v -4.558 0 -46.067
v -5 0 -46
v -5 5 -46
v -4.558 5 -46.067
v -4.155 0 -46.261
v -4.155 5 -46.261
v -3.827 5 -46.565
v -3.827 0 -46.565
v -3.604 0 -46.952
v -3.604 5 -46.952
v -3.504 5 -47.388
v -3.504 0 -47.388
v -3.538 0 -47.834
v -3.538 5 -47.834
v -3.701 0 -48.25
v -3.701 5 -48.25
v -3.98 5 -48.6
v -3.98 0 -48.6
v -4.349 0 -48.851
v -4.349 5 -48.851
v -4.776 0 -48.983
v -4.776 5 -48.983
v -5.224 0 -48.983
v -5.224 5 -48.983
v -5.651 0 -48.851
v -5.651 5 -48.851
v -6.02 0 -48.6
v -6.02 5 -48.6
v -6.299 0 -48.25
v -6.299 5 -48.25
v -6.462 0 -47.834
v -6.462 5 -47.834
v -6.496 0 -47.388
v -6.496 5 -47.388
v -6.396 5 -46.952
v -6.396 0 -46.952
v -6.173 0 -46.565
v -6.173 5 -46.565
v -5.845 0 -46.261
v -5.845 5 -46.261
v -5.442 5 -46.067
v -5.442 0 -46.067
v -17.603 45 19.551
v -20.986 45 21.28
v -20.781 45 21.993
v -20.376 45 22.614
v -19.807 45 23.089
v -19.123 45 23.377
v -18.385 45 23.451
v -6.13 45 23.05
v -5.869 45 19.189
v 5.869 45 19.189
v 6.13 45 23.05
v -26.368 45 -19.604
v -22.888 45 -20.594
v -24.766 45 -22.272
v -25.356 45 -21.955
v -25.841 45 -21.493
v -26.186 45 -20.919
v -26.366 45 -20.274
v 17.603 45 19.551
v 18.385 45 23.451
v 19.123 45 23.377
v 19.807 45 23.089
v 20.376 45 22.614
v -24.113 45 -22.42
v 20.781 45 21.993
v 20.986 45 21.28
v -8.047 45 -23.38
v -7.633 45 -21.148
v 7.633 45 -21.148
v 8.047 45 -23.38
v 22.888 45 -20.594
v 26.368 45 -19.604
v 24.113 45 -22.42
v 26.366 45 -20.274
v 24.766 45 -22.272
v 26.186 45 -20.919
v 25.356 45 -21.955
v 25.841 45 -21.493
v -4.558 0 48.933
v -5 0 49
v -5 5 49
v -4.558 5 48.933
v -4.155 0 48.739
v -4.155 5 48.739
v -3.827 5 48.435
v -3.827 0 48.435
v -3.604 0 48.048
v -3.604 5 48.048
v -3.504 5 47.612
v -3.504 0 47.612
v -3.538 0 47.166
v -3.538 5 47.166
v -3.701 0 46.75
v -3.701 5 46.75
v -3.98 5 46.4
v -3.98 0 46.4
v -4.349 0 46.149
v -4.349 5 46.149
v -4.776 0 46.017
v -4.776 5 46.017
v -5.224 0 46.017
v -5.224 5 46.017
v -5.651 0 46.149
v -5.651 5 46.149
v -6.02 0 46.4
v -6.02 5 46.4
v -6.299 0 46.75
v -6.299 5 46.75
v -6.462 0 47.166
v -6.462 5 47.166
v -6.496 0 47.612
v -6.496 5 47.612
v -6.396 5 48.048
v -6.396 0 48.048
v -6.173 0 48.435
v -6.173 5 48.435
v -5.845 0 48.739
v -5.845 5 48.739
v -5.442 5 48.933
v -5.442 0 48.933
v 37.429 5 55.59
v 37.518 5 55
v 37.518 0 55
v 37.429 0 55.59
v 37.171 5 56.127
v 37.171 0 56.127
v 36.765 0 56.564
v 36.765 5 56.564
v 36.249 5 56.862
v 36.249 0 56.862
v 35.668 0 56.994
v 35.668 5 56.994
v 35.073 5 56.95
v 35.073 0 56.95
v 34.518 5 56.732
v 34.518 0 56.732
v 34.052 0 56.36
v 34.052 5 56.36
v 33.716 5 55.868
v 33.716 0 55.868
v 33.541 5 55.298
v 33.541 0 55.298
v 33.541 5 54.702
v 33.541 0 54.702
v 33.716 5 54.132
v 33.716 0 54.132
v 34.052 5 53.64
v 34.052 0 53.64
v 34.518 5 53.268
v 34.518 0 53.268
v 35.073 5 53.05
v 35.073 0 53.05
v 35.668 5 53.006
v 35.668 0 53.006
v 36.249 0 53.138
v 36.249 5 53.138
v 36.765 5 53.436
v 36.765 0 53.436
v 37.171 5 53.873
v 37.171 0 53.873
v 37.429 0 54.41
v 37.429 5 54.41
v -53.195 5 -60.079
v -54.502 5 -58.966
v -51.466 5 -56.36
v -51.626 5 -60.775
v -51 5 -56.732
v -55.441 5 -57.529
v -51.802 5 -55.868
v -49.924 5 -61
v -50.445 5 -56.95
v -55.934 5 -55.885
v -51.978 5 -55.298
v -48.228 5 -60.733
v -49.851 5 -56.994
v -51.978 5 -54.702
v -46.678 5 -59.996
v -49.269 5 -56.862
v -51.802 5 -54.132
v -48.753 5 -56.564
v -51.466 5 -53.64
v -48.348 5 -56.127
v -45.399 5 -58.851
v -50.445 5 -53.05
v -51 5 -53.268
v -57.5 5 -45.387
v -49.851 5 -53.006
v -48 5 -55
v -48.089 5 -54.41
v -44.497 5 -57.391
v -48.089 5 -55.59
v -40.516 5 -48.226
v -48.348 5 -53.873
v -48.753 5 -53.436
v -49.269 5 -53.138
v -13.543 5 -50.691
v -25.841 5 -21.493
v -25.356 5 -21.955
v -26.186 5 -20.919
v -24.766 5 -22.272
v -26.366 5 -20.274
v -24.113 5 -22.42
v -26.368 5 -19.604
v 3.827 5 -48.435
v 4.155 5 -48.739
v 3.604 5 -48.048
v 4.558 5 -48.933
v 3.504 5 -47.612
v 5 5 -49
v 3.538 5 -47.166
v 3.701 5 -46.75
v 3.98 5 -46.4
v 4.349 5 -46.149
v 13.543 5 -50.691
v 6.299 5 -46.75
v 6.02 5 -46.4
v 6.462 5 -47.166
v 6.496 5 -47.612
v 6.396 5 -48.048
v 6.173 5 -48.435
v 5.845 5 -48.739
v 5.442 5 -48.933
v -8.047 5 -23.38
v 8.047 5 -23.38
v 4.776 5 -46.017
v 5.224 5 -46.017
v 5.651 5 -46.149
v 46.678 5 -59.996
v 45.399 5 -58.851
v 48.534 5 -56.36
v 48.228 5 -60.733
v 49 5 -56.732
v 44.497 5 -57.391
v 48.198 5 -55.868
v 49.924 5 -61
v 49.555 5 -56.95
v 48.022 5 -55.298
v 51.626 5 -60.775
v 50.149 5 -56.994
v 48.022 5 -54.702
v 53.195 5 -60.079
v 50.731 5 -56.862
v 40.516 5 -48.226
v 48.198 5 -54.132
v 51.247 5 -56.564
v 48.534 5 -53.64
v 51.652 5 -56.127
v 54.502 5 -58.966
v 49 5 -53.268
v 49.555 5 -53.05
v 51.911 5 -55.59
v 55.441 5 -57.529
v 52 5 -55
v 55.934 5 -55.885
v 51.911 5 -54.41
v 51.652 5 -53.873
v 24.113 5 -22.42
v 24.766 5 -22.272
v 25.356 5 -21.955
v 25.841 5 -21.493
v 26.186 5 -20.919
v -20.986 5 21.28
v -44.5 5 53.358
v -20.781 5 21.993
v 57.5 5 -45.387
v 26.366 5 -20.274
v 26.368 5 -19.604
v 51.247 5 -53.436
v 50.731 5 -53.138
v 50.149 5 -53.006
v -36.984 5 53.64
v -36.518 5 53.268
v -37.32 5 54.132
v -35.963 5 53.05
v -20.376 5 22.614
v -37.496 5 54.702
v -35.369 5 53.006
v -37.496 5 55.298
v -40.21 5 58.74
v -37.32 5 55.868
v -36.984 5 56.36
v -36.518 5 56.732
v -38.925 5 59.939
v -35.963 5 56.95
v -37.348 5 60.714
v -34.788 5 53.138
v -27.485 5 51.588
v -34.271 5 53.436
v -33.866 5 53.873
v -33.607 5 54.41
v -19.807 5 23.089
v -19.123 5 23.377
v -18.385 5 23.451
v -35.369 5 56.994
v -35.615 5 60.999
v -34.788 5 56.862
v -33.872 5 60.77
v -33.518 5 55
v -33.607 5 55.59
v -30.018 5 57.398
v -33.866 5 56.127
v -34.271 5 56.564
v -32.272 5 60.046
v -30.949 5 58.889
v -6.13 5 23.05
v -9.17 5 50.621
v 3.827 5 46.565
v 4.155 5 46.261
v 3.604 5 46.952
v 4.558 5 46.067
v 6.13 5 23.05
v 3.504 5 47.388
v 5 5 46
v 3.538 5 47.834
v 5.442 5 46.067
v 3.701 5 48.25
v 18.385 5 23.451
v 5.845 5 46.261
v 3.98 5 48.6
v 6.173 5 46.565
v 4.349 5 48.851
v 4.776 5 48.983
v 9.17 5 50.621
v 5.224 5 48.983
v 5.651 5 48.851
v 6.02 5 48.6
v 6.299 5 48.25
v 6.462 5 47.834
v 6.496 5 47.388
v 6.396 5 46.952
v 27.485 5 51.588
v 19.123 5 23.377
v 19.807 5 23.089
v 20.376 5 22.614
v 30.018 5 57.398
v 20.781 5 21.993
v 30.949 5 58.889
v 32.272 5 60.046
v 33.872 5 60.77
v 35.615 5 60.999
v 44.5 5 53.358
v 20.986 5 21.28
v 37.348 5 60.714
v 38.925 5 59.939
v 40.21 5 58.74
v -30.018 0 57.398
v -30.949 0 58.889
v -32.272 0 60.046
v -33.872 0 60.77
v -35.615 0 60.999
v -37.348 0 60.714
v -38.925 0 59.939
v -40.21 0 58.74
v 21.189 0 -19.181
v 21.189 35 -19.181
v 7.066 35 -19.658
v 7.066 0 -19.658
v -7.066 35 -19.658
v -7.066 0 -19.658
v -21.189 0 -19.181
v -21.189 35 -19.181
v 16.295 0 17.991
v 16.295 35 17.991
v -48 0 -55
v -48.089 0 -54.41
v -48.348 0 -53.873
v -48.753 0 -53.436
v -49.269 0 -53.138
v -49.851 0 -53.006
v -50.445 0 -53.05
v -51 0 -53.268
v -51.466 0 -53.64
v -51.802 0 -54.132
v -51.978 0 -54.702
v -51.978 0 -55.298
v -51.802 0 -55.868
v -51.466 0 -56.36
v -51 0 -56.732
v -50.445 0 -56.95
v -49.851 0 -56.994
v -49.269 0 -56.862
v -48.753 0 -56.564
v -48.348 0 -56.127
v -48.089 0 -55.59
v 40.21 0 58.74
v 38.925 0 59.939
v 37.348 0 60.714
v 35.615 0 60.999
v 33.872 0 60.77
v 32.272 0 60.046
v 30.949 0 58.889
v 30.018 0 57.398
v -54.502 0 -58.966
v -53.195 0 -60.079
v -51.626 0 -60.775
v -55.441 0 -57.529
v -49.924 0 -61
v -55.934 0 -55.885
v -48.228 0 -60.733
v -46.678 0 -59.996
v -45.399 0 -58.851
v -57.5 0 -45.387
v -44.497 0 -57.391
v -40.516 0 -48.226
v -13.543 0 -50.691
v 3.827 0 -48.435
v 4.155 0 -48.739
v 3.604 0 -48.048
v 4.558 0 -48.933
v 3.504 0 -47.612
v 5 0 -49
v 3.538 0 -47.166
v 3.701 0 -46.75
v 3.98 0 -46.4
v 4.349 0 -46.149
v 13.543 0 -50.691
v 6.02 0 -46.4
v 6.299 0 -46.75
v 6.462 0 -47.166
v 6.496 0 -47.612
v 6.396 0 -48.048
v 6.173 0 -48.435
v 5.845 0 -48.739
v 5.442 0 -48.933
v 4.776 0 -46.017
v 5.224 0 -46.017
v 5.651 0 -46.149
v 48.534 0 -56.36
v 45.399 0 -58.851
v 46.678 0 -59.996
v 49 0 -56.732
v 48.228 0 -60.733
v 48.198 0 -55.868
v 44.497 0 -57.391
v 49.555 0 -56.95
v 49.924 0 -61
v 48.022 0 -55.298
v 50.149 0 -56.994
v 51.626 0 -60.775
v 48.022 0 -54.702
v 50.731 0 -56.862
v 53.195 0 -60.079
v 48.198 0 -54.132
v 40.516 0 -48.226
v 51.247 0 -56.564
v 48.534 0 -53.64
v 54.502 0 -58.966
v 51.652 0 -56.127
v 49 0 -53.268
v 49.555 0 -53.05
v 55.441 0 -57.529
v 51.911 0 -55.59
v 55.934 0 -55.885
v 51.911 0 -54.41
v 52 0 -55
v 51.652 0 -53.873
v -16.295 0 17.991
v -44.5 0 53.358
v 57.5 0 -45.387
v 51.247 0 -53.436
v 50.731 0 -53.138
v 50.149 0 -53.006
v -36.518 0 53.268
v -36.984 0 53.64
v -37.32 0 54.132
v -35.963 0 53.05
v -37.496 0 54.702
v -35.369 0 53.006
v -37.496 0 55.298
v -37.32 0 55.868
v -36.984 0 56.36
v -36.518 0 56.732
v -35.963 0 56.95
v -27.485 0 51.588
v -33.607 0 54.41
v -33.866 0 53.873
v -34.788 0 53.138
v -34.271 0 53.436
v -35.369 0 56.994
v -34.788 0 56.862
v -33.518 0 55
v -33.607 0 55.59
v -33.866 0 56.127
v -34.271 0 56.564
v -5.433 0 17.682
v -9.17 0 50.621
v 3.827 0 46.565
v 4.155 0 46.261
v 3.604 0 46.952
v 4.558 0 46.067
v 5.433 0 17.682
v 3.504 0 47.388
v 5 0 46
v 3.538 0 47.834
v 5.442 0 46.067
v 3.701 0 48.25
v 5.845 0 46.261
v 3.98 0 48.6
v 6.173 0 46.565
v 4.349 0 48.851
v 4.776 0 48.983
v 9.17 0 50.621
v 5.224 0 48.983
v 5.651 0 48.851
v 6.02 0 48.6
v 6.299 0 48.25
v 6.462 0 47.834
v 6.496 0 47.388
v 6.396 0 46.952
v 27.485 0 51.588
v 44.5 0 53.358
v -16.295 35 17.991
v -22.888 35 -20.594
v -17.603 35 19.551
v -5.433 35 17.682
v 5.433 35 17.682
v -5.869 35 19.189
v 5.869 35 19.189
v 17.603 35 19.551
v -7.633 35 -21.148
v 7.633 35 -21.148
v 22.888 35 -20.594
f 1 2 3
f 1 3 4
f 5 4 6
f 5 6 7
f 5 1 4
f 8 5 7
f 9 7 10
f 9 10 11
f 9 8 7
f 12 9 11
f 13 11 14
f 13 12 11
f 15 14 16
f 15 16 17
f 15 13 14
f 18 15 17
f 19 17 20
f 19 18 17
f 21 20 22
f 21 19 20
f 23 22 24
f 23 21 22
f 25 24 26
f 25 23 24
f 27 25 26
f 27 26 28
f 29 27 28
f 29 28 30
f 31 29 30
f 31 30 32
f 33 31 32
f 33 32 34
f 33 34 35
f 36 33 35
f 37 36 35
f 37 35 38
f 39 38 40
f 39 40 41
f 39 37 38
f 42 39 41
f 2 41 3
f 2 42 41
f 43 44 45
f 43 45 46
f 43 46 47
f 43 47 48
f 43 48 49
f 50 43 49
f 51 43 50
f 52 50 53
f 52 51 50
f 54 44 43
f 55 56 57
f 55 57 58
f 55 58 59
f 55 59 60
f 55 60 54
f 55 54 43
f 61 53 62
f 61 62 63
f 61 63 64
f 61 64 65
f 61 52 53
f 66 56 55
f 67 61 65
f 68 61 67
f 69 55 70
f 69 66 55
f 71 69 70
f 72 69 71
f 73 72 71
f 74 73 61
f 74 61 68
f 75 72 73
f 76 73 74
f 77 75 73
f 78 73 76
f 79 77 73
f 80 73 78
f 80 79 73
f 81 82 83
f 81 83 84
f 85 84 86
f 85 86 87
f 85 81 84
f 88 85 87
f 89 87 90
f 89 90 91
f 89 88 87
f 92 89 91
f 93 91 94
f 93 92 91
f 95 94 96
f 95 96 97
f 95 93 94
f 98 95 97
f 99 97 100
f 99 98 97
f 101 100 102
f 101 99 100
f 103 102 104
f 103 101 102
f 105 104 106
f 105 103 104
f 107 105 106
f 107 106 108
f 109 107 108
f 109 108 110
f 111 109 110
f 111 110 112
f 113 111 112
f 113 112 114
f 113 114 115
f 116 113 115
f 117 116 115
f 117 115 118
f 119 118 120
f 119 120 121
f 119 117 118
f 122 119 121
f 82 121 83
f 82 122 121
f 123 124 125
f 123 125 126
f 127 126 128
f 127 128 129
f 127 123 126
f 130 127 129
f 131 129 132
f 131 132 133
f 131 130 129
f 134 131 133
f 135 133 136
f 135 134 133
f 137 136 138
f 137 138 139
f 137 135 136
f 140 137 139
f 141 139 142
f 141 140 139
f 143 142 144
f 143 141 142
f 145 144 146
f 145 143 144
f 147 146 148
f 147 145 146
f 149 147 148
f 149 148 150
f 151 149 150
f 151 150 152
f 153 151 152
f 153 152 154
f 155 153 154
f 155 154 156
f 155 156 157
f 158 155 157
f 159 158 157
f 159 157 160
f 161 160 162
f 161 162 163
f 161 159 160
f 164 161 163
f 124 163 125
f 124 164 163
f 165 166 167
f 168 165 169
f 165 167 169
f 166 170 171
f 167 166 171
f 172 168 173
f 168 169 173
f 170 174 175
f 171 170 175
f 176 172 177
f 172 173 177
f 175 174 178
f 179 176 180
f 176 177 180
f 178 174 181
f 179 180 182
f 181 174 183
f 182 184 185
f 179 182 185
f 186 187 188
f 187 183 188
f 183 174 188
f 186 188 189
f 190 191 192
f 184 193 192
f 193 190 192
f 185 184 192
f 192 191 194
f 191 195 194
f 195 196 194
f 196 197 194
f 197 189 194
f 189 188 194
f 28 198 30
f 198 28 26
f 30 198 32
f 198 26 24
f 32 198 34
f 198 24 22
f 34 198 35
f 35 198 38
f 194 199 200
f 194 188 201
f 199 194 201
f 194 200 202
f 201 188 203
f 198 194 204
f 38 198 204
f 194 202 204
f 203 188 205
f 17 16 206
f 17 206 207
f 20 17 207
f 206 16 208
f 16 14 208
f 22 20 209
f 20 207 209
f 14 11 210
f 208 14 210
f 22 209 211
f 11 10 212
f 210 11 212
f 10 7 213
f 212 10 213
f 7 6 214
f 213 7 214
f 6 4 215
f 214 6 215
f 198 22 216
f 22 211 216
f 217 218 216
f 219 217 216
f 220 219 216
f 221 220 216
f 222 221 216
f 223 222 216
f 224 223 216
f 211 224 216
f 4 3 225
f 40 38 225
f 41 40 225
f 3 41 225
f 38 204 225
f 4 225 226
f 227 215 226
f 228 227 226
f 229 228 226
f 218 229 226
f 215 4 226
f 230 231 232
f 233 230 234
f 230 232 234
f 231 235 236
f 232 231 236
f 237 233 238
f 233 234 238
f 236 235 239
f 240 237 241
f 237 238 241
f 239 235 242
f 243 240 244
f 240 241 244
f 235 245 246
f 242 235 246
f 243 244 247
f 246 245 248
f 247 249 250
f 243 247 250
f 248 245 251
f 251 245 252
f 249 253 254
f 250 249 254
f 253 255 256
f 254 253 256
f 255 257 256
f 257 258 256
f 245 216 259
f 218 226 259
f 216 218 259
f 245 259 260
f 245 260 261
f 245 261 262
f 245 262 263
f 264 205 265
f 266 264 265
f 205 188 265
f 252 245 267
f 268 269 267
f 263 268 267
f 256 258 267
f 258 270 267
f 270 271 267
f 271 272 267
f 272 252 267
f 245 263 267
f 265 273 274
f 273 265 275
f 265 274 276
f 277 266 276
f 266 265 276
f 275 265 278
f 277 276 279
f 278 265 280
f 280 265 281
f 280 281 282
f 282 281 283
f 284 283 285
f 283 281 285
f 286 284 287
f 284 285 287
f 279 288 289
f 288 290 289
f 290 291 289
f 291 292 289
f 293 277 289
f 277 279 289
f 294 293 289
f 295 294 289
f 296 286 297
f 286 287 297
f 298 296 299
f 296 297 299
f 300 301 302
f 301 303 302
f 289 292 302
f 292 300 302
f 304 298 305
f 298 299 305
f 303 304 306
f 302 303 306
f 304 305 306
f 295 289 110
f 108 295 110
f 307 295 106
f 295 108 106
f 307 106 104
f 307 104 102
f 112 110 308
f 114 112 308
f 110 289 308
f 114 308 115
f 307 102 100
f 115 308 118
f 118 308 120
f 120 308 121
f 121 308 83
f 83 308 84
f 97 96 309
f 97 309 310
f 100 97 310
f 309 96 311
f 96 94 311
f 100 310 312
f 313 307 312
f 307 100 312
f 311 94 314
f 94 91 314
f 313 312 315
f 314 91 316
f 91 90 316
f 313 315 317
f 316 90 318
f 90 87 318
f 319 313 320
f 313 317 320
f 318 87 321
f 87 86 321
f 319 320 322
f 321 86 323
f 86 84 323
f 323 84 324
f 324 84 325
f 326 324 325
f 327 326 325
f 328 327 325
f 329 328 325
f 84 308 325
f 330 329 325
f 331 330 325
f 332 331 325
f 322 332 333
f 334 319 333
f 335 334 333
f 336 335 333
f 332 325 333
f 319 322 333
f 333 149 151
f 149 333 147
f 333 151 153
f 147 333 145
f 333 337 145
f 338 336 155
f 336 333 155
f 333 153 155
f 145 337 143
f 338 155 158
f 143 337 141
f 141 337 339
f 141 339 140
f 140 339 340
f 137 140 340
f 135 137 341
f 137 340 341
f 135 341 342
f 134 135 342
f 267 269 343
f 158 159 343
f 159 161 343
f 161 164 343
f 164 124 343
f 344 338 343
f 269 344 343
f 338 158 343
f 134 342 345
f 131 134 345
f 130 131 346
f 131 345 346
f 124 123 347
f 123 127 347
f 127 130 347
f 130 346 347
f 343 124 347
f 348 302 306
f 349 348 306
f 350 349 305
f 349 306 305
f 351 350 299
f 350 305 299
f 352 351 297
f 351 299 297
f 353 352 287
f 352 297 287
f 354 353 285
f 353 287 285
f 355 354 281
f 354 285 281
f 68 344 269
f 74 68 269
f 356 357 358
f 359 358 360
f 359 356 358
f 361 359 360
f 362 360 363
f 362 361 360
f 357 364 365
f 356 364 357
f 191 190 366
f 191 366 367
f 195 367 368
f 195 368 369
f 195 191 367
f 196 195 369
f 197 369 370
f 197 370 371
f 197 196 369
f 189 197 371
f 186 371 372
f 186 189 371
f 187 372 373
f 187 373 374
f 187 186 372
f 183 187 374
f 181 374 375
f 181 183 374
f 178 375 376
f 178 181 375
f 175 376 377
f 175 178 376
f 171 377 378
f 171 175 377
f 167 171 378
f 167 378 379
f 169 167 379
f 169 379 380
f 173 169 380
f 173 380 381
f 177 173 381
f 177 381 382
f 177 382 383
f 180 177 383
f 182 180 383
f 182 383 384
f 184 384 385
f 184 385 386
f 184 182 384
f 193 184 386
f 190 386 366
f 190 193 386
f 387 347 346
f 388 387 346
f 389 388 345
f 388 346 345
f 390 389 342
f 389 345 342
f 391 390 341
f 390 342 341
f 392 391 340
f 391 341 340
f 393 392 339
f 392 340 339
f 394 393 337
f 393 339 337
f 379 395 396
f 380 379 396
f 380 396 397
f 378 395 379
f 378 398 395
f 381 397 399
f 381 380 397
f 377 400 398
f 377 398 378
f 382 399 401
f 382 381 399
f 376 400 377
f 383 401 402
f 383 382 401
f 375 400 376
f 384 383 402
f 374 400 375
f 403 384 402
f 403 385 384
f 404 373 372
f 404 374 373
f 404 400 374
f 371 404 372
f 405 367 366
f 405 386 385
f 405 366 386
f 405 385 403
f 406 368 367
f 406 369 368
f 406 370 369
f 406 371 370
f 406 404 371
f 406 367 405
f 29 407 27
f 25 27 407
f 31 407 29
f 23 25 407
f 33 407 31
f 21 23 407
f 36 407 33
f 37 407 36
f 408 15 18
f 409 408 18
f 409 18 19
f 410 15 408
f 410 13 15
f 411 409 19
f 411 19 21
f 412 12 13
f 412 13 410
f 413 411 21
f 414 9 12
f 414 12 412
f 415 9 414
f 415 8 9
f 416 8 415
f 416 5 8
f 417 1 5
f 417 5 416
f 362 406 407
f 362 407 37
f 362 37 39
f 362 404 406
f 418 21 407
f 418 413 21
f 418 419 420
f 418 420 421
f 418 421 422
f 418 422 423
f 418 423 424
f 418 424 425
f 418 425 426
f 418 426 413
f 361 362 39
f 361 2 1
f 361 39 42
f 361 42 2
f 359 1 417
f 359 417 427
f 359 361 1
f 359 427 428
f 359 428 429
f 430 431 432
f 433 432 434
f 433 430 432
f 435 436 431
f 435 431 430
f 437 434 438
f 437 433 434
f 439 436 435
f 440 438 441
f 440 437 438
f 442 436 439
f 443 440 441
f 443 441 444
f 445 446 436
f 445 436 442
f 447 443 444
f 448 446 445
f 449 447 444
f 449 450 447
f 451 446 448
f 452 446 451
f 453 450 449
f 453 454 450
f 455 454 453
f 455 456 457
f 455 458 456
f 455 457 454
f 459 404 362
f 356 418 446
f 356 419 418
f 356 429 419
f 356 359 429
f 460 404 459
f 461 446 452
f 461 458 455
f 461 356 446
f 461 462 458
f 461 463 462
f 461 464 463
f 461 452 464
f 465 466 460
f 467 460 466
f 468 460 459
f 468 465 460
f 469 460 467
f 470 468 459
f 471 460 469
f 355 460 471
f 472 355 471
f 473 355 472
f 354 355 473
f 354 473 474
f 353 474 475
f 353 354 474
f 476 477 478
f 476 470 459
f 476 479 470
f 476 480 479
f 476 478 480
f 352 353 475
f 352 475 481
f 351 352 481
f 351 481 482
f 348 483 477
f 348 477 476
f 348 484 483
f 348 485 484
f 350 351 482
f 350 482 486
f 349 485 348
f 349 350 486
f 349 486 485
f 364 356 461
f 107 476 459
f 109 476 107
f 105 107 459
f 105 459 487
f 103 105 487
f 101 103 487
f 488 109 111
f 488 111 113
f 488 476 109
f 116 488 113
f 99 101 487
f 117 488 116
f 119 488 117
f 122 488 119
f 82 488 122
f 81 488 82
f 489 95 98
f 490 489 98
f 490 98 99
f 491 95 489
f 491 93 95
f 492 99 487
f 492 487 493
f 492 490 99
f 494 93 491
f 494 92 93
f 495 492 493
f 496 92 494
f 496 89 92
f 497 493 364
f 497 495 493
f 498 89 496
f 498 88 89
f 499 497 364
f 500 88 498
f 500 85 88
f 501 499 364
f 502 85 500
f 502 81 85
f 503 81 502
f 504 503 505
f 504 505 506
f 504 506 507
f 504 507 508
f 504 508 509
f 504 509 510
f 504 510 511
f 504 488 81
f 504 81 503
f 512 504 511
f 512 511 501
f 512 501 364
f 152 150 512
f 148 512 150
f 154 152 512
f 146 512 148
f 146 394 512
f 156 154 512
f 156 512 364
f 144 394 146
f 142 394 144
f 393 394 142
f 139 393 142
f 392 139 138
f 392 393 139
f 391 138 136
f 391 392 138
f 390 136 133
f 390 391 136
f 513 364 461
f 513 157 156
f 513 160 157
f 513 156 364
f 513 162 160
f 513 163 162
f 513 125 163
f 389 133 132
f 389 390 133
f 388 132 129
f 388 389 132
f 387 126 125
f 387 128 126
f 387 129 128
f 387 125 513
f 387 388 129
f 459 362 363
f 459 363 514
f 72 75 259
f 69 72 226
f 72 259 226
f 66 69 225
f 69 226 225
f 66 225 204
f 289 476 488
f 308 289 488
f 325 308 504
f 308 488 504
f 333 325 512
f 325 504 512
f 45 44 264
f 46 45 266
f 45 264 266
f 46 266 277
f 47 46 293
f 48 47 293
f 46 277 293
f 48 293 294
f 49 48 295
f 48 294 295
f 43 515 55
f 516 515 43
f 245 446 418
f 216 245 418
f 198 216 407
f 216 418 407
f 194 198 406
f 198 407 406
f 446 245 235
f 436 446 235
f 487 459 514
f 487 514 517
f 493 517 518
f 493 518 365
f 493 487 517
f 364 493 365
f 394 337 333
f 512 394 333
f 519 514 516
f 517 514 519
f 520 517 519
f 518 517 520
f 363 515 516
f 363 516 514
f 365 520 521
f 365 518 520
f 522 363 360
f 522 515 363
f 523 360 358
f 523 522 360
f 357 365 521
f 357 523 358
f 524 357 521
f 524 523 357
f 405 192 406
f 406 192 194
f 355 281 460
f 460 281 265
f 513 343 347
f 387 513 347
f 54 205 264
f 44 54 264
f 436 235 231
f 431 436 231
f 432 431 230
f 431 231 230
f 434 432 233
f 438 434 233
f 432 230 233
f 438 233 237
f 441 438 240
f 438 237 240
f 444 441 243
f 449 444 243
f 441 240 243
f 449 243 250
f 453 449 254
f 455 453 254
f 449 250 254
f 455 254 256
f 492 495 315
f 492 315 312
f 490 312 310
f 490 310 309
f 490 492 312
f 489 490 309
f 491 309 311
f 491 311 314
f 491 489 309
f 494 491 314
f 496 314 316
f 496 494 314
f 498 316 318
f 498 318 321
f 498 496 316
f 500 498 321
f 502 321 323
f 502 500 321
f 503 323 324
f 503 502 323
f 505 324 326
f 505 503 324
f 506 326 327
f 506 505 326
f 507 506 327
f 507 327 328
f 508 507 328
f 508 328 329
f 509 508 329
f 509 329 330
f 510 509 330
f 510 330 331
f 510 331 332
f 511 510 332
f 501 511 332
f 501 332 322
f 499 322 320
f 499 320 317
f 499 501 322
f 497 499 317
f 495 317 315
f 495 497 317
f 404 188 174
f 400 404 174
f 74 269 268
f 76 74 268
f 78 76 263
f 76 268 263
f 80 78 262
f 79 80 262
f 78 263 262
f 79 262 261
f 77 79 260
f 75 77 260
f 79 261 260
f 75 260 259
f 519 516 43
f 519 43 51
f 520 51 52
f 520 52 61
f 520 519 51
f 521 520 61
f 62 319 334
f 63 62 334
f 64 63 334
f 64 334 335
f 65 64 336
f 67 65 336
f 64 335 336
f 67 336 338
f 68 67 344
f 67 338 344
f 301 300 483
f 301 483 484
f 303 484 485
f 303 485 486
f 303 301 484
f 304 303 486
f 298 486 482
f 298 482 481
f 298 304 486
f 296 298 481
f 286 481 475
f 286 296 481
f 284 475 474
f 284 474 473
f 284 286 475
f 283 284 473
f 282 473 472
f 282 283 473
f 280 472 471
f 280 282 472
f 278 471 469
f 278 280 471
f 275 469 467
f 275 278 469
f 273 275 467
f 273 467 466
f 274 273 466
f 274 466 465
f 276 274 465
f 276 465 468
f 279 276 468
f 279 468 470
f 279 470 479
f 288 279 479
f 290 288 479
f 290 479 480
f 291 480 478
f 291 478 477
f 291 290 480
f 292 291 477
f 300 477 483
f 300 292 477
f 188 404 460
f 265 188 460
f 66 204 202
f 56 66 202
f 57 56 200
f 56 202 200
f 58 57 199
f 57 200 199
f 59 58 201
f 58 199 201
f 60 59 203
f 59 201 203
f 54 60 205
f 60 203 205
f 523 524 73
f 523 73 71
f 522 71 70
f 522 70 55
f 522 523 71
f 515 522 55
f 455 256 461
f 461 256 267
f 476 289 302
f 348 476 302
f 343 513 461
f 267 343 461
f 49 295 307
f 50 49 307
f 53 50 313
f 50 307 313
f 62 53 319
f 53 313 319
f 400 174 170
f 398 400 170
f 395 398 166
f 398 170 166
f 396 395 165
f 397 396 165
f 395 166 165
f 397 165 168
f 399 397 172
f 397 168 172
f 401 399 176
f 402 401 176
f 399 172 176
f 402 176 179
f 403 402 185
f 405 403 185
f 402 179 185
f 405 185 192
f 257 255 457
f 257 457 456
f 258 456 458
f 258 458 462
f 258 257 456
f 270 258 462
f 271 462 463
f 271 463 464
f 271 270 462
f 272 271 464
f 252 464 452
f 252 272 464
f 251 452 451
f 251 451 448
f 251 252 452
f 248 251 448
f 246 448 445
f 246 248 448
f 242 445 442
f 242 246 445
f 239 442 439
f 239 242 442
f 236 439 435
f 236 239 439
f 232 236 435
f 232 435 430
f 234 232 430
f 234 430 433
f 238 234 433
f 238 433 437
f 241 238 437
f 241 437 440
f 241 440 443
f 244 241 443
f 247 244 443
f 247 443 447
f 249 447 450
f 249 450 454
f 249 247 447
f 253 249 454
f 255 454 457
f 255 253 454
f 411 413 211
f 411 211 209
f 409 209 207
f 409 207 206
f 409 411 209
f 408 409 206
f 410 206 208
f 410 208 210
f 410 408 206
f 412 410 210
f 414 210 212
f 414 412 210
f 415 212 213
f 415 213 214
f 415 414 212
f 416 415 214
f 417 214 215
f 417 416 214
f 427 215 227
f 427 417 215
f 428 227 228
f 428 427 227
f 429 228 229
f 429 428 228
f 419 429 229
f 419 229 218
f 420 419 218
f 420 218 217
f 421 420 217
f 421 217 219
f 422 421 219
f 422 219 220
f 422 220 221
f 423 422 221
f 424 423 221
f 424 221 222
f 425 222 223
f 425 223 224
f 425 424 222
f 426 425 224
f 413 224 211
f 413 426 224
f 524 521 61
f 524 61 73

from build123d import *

# Parameters (mm, degrees)
SKETCH1_R               = 1.5
BOSS_EXTRUDE1_DEPTH     = 5
BOSS_EXTRUDE2_DEPTH     = 40
CUT_EXTRUDE1_DEPTH      = 91.434261951
BOSS_EXTRUDE3_START     = -5
BOSS_EXTRUDE3_OUTLINE_R = 2
BOSS_EXTRUDE3_DEPTH     = 5
CUT_EXTRUDE2_START      = -10
CUT_EXTRUDE2_DEPTH      = 10


# Read off the part's stored shape, not the designer's step: Boss-Extrude3
with BuildPart() as part:
    # Sketch1 → Boss-Extrude1 (new body)
    with BuildSketch(Plane(origin=(0, 0, 0), x_dir=(1, 0, 0), z_dir=(0, 1, 0))):
        with BuildLine():
            Line((-57.5, 45.38652637), (-44.5, -53.358277095))
            ThreePointArc((-44.5, -53.358277095), (0, -50.5), (44.5, -53.358277095))
            Line((44.5, -53.358277095), (57.5, 45.38652637))
            ThreePointArc((57.5, 45.38652637), (0, 51), (-57.5, 45.38652637))
        make_face()
        with Locations(Location((-5, 47.5, 0), (0, 0, 270))):
            Circle(SKETCH1_R, mode=Mode.SUBTRACT)
        with Locations(Location((-5, -47.5, 0), (0, 0, 270))):
            Circle(SKETCH1_R, mode=Mode.SUBTRACT)
        with Locations(Location((5, -47.5, 0), (0, 0, 90))):
            Circle(SKETCH1_R, mode=Mode.SUBTRACT)
        with Locations(Location((5, 47.5, 0), (0, 0, 90))):
            Circle(SKETCH1_R, mode=Mode.SUBTRACT)
    extrude(amount=BOSS_EXTRUDE1_DEPTH)

    # Sketch2 → Boss-Extrude2 (add)
    with BuildSketch(Plane(origin=(0, 5, 0), x_dir=(1, 0, 0), z_dir=(0, 1, 0))):
        with BuildLine():
            Line((-26.368366328, 19.603975201), (-20.985908119, -21.279853883))
            ThreePointArc((-20.985908119, -21.279853883), (-20.109118271, -22.872956361), (-18.384839881, -23.450537503))
            ThreePointArc((-18.384839881, -23.450537503), (0, -23), (18.384839881, -23.450537503))
            ThreePointArc((18.384839881, -23.450537503), (20.109118271, -22.872956361), (20.985908119, -21.279853883))
            Line((20.985908119, -21.279853883), (26.368366328, 19.603975201))
            ThreePointArc((26.368366328, 19.603975201), (25.841207036, 21.492926829), (24.11319073, 22.420285883))
            ThreePointArc((24.11319073, 22.420285883), (0, 23.5), (-24.11319073, 22.420285883))
            ThreePointArc((-24.11319073, 22.420285883), (-25.841207036, 21.492926829), (-26.368366328, 19.603975201))
        make_face()
    extrude(amount=BOSS_EXTRUDE2_DEPTH)

    # Sketch3 → Cut-Extrude1 (cut, through all)
    with BuildSketch(Plane(origin=(0, 0, 0), x_dir=(1, 0, 0), z_dir=(0, 1, 0))):
        with BuildLine():
            Line((-21.18897611, 19.181297446), (-16.295136113, -17.99110784))
            ThreePointArc((-16.295136113, -17.99110784), (0, -17.643611739), (16.295136113, -17.99110784))
            Line((16.295136113, -17.99110784), (21.18897611, 19.181297446))
            ThreePointArc((21.18897611, 19.181297446), (0, 19.717805469), (-21.18897611, 19.181297446))
        make_face()
    extrude(amount=CUT_EXTRUDE1_DEPTH, mode=Mode.SUBTRACT)

    # Boss-Extrude3 outline → Boss-Extrude3 (add)
    # profile 1 of 4: a face of its own
    with BuildSketch(Plane.XZ.offset(BOSS_EXTRUDE3_START)):
        with BuildLine():
            Line((-44.496886412, -57.390761561), (-40.51552272, -48.226360981))
            ThreePointArc((-40.51552272, -48.226360981), (-49.028326901, -46.92944202), (-57.5, -45.38652637))
            Line((-57.5, -45.38652637), (-55.934374164, -55.884987732))
            ThreePointArc((-55.934374164, -55.884987732), (-50.783157153, -60.948669168), (-44.496886412, -57.390761561))
        make_face()
        with Locations((-50, -55)):
            Circle(BOSS_EXTRUDE3_OUTLINE_R, mode=Mode.SUBTRACT)
    # profile 2 of 4: a face of its own
    with BuildSketch(Plane.XZ.offset(BOSS_EXTRUDE3_START)):
        with BuildLine():
            Line((40.51552272, -48.226360981), (44.496886412, -57.390761561))
            ThreePointArc((44.496886412, -57.390761561), (50.783157153, -60.948669168), (55.934374164, -55.884987732))
            Line((55.934374164, -55.884987732), (57.5, -45.38652637))
            ThreePointArc((57.5, -45.38652637), (49.028326901, -46.92944202), (40.51552272, -48.226360981))
        make_face()
        with Locations((50, -55)):
            Circle(BOSS_EXTRUDE3_OUTLINE_R, mode=Mode.SUBTRACT)
    # profile 3 of 4: a face of its own
    with BuildSketch(Plane.XZ.offset(BOSS_EXTRUDE3_START)):
        with BuildLine():
            Line((44.5, 53.358277095), (40.209954991, 58.740009651))
            ThreePointArc((40.209954991, 58.740009651), (34.735068112, 60.948669168), (30.018376627, 57.398262905))
            Line((30.018376627, 57.398262905), (27.484562868, 51.587560448))
            ThreePointArc((27.484562868, 51.587560448), (36.003169058, 52.368295779), (44.5, 53.358277095))
        make_face()
        with Locations((35.518225265, 55)):
            Circle(BOSS_EXTRUDE3_OUTLINE_R, mode=Mode.SUBTRACT)
    # profile 4 of 4: a face of its own
    with BuildSketch(Plane.XZ.offset(BOSS_EXTRUDE3_START)):
        with BuildLine():
            ThreePointArc((-44.5, 53.358277095), (-36.003169058, 52.368295779), (-27.484562868, 51.587560448))
            Line((-27.484562868, 51.587560448), (-30.018376627, 57.398262905))
            ThreePointArc((-30.018376627, 57.398262905), (-34.735068112, 60.948669168), (-40.209954991, 58.740009651))
            Line((-40.209954991, 58.740009651), (-44.5, 53.358277095))
        make_face()
        with Locations((-35.518225265, 55)):
            Circle(BOSS_EXTRUDE3_OUTLINE_R, mode=Mode.SUBTRACT)
    extrude(amount=BOSS_EXTRUDE3_DEPTH)

    # Sketch9 → Cut-Extrude2 (cut)
    with BuildSketch(Plane(origin=(0, 45, 0), x_dir=(1, 0, 0), z_dir=(0, 1, 0)).offset(CUT_EXTRUDE2_START)):
        with BuildLine():
            Line((17.602749325, -19.55074577), (22.887903449, 20.593985408))
            ThreePointArc((22.887903449, 20.593985408), (0, 21.217805469), (-22.887903449, 20.593985408))
            Line((-22.887903449, 20.593985408), (-17.602749325, -19.55074577))
            ThreePointArc((-17.602749325, -19.55074577), (0, -19.143611739), (17.602749325, -19.55074577))
        make_face()
        with BuildLine():
            Line((16.295136113, -17.99110784), (21.18897611, 19.181297446))
            ThreePointArc((21.18897611, 19.181297446), (0, 19.717805469), (-21.18897611, 19.181297446))
            Line((-21.18897611, 19.181297446), (-16.295136113, -17.99110784))
            ThreePointArc((-16.295136113, -17.99110784), (0, -17.643611739), (16.295136113, -17.99110784))
        make_face(mode=Mode.SUBTRACT)
    extrude(amount=CUT_EXTRUDE2_DEPTH, mode=Mode.SUBTRACT)


solid = part.part
